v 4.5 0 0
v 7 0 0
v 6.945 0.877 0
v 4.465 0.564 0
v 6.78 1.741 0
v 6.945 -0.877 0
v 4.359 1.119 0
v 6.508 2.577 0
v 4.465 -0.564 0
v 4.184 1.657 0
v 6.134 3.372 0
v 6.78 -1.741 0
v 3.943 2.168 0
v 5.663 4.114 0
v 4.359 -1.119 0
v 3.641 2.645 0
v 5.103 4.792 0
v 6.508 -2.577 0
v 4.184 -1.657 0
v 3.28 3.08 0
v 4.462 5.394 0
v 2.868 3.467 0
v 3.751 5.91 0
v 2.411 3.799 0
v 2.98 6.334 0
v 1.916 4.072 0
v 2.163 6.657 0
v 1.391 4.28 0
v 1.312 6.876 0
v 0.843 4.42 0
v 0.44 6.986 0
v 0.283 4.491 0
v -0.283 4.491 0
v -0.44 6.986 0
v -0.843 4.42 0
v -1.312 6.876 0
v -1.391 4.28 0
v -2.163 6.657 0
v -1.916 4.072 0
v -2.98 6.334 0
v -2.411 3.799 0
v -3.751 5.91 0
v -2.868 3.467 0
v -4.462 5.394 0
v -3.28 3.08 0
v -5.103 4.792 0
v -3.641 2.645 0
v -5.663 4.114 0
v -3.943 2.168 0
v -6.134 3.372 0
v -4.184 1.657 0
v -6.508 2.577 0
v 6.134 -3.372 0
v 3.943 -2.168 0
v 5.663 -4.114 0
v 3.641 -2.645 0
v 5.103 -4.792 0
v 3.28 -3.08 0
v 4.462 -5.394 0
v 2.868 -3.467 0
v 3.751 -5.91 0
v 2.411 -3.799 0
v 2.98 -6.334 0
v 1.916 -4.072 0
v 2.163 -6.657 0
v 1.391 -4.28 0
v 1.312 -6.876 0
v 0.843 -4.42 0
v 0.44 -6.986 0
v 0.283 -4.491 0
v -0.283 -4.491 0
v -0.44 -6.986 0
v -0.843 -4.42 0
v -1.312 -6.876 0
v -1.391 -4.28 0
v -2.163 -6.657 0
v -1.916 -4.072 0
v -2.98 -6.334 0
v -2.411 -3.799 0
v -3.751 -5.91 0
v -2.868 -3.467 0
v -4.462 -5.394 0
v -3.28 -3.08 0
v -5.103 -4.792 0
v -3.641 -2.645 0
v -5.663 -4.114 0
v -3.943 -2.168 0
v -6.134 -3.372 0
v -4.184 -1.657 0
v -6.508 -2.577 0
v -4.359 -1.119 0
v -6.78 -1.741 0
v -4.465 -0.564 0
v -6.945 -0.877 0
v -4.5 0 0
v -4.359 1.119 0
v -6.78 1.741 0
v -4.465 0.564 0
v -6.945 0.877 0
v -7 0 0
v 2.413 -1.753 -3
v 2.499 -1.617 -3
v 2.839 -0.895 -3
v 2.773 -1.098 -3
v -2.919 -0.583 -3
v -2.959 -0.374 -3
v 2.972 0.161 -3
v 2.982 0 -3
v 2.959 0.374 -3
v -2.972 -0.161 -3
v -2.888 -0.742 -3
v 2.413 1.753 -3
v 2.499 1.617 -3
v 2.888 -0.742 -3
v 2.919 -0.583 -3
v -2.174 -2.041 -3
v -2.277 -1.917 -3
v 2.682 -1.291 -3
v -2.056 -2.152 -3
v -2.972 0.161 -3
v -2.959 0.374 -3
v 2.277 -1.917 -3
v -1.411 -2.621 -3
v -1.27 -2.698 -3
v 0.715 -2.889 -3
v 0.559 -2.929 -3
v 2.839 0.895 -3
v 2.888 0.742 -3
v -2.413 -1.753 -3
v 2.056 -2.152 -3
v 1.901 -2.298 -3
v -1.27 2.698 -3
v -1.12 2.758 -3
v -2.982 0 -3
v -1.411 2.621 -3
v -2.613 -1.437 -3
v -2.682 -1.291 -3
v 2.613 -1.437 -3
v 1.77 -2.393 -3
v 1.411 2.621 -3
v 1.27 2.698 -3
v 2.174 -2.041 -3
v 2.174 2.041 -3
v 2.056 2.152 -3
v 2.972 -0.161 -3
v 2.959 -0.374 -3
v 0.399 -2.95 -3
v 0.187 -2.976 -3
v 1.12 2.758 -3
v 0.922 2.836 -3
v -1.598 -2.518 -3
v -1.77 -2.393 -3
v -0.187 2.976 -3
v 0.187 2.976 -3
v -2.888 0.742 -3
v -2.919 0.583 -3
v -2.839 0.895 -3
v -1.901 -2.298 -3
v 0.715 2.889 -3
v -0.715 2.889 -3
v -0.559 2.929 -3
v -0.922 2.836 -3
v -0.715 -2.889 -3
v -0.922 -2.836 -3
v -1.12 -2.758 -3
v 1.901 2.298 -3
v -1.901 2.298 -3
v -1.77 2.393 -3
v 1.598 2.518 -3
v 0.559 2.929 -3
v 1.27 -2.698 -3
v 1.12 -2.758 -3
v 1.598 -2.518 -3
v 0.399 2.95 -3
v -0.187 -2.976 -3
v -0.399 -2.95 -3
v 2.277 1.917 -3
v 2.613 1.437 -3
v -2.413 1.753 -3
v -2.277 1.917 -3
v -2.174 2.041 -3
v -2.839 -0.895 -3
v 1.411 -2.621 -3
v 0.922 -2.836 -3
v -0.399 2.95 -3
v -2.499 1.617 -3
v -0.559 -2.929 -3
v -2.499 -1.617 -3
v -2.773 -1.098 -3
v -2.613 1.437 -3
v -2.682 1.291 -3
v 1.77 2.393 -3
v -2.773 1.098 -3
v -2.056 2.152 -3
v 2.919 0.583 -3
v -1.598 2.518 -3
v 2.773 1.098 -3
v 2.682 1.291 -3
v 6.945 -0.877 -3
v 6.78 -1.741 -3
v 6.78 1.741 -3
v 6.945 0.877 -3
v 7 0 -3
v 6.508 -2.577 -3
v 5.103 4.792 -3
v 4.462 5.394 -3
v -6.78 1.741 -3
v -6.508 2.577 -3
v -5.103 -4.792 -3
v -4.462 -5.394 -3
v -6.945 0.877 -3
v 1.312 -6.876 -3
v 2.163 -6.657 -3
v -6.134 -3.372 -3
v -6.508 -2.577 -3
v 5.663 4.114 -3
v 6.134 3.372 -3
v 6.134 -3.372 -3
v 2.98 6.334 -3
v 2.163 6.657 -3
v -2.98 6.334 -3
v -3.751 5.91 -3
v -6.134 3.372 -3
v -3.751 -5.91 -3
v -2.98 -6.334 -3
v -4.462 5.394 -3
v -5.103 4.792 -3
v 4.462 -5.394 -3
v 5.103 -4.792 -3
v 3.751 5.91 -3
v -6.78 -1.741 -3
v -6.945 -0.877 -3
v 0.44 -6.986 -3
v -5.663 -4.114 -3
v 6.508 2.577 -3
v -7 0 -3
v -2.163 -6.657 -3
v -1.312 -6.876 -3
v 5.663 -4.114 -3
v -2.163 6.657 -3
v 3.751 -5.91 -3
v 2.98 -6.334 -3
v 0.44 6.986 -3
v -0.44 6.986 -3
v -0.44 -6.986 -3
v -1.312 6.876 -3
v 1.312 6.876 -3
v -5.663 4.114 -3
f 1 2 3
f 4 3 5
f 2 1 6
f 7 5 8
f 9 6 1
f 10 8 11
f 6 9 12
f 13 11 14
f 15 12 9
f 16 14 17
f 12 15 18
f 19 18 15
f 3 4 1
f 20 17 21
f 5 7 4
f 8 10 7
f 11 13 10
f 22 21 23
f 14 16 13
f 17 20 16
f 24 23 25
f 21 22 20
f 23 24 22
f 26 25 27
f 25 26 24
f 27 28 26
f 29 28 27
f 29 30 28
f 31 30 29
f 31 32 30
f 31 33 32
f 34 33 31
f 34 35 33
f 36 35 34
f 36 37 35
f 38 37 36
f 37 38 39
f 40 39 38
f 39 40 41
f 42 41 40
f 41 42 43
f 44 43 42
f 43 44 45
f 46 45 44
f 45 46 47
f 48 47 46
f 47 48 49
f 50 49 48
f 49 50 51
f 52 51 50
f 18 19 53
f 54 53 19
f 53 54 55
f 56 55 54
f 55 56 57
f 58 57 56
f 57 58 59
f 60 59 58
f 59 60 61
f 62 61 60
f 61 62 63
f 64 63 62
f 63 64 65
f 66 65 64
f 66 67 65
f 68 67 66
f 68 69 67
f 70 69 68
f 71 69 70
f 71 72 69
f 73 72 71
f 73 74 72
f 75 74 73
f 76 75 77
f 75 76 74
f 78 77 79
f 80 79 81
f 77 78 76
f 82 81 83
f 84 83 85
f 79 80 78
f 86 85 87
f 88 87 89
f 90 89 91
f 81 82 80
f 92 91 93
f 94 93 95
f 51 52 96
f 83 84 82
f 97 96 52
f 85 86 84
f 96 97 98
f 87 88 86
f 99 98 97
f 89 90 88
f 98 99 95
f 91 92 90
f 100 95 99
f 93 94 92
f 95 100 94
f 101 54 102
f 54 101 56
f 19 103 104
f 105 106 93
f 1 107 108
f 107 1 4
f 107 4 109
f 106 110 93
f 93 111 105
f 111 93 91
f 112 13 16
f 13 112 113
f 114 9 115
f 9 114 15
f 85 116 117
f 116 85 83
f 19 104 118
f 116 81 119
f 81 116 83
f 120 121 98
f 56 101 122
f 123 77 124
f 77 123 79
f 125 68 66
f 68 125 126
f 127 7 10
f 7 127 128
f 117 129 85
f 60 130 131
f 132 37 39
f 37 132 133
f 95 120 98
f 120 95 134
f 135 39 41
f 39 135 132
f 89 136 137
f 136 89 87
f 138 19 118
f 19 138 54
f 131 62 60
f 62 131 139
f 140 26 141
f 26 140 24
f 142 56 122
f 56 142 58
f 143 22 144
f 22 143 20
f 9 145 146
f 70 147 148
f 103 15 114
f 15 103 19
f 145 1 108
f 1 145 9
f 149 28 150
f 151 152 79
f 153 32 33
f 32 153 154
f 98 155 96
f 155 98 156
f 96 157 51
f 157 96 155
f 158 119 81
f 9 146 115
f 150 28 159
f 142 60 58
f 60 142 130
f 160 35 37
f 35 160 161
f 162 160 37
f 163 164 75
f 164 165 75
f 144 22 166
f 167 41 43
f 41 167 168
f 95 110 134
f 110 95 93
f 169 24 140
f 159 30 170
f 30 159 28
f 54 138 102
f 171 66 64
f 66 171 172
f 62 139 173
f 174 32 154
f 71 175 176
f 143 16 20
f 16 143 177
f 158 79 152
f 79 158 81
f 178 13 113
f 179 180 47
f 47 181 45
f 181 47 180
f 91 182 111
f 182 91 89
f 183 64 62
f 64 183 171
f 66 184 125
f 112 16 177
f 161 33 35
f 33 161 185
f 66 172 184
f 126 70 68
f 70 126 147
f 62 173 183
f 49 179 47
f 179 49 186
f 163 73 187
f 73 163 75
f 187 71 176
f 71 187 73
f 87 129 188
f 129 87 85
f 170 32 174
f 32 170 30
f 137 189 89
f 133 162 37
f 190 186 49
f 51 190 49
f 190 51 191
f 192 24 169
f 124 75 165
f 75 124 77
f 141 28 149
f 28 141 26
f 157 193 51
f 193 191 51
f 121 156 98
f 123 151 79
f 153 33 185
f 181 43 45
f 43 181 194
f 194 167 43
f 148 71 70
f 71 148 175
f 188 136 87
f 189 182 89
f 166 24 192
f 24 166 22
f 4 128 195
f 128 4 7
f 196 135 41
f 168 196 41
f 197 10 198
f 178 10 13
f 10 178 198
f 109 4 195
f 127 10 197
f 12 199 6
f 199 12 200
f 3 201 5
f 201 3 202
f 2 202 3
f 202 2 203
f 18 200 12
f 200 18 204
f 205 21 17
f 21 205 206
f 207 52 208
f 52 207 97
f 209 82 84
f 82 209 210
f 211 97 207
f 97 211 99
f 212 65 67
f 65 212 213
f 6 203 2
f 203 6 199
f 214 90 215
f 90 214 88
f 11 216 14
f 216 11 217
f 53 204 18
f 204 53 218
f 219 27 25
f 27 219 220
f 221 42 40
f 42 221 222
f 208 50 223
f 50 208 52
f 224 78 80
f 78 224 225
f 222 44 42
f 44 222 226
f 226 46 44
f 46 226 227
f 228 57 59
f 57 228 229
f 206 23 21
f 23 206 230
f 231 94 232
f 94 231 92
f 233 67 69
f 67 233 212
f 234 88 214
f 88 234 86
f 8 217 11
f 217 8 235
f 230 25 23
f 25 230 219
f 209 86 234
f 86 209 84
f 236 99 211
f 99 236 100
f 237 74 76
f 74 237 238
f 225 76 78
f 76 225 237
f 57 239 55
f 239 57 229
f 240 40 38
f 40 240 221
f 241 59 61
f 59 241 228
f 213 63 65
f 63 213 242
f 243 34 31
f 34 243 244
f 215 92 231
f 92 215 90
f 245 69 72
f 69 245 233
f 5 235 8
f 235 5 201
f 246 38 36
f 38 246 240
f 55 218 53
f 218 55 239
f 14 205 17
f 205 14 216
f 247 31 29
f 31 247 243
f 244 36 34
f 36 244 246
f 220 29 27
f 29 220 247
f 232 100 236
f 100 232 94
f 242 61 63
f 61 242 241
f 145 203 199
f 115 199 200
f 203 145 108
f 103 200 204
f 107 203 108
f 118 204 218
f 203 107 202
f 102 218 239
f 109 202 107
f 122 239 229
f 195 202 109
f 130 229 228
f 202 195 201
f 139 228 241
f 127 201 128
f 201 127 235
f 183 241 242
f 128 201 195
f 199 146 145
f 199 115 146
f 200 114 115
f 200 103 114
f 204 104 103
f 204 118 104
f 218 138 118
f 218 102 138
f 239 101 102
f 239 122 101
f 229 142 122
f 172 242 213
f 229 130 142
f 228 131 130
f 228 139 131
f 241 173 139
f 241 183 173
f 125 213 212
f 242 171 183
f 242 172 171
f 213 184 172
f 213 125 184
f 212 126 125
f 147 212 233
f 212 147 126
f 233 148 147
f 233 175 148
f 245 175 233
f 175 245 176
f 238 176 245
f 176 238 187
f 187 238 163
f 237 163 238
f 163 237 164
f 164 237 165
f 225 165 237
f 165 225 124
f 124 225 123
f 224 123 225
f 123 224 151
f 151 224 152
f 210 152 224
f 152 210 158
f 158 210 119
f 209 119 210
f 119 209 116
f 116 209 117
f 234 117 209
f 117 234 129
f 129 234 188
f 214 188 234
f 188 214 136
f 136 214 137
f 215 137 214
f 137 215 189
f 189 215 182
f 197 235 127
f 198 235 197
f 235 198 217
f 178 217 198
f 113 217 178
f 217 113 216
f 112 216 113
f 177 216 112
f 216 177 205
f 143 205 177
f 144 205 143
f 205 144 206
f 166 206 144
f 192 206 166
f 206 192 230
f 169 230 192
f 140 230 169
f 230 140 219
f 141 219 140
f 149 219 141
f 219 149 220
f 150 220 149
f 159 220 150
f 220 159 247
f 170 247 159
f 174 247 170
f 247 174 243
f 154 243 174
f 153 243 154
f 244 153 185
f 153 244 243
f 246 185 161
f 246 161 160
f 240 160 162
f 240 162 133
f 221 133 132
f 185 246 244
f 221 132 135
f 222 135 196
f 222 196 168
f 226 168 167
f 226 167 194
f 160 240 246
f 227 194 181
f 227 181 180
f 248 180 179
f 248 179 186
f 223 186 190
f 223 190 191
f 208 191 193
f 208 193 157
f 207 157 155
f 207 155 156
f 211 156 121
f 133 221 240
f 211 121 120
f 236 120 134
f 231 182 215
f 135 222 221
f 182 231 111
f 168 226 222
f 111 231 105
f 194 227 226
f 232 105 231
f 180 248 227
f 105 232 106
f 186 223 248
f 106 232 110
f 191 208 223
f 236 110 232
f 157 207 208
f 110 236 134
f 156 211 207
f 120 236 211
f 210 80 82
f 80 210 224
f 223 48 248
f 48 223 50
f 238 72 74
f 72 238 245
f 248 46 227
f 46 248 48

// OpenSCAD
$fn = 50;


difference() {
	union() {
		translate(v = [0, 0, -3.0000000000]) {
			cylinder(h = 3, r = 7.0000000000);
		}
		cylinder(h = 0, r = 17.0000000000);
	}
	union() {
		translate(v = [0, 0, 0]) {
			rotate(a = [0, 0, 0]) {
				difference() {
					union() {
						#translate(v = [0, 0, -3.0000000000]) {
							cylinder(h = 3, r = 2.2500000000);
						}
						#translate(v = [0, 0, -4.2000000000]) {
							cylinder(h = 4.2000000000, r1 = 2.3750000000, r2 = 4.5000000000);
						}
						#translate(v = [0, 0, -3.0000000000]) {
							cylinder(h = 3, r = 2.3750000000);
						}
						#translate(v = [0, 0, -3.0000000000]) {
							cylinder(h = 3, r = 2.2500000000);
						}
					}
					union();
				}
			}
		}
	}
}
